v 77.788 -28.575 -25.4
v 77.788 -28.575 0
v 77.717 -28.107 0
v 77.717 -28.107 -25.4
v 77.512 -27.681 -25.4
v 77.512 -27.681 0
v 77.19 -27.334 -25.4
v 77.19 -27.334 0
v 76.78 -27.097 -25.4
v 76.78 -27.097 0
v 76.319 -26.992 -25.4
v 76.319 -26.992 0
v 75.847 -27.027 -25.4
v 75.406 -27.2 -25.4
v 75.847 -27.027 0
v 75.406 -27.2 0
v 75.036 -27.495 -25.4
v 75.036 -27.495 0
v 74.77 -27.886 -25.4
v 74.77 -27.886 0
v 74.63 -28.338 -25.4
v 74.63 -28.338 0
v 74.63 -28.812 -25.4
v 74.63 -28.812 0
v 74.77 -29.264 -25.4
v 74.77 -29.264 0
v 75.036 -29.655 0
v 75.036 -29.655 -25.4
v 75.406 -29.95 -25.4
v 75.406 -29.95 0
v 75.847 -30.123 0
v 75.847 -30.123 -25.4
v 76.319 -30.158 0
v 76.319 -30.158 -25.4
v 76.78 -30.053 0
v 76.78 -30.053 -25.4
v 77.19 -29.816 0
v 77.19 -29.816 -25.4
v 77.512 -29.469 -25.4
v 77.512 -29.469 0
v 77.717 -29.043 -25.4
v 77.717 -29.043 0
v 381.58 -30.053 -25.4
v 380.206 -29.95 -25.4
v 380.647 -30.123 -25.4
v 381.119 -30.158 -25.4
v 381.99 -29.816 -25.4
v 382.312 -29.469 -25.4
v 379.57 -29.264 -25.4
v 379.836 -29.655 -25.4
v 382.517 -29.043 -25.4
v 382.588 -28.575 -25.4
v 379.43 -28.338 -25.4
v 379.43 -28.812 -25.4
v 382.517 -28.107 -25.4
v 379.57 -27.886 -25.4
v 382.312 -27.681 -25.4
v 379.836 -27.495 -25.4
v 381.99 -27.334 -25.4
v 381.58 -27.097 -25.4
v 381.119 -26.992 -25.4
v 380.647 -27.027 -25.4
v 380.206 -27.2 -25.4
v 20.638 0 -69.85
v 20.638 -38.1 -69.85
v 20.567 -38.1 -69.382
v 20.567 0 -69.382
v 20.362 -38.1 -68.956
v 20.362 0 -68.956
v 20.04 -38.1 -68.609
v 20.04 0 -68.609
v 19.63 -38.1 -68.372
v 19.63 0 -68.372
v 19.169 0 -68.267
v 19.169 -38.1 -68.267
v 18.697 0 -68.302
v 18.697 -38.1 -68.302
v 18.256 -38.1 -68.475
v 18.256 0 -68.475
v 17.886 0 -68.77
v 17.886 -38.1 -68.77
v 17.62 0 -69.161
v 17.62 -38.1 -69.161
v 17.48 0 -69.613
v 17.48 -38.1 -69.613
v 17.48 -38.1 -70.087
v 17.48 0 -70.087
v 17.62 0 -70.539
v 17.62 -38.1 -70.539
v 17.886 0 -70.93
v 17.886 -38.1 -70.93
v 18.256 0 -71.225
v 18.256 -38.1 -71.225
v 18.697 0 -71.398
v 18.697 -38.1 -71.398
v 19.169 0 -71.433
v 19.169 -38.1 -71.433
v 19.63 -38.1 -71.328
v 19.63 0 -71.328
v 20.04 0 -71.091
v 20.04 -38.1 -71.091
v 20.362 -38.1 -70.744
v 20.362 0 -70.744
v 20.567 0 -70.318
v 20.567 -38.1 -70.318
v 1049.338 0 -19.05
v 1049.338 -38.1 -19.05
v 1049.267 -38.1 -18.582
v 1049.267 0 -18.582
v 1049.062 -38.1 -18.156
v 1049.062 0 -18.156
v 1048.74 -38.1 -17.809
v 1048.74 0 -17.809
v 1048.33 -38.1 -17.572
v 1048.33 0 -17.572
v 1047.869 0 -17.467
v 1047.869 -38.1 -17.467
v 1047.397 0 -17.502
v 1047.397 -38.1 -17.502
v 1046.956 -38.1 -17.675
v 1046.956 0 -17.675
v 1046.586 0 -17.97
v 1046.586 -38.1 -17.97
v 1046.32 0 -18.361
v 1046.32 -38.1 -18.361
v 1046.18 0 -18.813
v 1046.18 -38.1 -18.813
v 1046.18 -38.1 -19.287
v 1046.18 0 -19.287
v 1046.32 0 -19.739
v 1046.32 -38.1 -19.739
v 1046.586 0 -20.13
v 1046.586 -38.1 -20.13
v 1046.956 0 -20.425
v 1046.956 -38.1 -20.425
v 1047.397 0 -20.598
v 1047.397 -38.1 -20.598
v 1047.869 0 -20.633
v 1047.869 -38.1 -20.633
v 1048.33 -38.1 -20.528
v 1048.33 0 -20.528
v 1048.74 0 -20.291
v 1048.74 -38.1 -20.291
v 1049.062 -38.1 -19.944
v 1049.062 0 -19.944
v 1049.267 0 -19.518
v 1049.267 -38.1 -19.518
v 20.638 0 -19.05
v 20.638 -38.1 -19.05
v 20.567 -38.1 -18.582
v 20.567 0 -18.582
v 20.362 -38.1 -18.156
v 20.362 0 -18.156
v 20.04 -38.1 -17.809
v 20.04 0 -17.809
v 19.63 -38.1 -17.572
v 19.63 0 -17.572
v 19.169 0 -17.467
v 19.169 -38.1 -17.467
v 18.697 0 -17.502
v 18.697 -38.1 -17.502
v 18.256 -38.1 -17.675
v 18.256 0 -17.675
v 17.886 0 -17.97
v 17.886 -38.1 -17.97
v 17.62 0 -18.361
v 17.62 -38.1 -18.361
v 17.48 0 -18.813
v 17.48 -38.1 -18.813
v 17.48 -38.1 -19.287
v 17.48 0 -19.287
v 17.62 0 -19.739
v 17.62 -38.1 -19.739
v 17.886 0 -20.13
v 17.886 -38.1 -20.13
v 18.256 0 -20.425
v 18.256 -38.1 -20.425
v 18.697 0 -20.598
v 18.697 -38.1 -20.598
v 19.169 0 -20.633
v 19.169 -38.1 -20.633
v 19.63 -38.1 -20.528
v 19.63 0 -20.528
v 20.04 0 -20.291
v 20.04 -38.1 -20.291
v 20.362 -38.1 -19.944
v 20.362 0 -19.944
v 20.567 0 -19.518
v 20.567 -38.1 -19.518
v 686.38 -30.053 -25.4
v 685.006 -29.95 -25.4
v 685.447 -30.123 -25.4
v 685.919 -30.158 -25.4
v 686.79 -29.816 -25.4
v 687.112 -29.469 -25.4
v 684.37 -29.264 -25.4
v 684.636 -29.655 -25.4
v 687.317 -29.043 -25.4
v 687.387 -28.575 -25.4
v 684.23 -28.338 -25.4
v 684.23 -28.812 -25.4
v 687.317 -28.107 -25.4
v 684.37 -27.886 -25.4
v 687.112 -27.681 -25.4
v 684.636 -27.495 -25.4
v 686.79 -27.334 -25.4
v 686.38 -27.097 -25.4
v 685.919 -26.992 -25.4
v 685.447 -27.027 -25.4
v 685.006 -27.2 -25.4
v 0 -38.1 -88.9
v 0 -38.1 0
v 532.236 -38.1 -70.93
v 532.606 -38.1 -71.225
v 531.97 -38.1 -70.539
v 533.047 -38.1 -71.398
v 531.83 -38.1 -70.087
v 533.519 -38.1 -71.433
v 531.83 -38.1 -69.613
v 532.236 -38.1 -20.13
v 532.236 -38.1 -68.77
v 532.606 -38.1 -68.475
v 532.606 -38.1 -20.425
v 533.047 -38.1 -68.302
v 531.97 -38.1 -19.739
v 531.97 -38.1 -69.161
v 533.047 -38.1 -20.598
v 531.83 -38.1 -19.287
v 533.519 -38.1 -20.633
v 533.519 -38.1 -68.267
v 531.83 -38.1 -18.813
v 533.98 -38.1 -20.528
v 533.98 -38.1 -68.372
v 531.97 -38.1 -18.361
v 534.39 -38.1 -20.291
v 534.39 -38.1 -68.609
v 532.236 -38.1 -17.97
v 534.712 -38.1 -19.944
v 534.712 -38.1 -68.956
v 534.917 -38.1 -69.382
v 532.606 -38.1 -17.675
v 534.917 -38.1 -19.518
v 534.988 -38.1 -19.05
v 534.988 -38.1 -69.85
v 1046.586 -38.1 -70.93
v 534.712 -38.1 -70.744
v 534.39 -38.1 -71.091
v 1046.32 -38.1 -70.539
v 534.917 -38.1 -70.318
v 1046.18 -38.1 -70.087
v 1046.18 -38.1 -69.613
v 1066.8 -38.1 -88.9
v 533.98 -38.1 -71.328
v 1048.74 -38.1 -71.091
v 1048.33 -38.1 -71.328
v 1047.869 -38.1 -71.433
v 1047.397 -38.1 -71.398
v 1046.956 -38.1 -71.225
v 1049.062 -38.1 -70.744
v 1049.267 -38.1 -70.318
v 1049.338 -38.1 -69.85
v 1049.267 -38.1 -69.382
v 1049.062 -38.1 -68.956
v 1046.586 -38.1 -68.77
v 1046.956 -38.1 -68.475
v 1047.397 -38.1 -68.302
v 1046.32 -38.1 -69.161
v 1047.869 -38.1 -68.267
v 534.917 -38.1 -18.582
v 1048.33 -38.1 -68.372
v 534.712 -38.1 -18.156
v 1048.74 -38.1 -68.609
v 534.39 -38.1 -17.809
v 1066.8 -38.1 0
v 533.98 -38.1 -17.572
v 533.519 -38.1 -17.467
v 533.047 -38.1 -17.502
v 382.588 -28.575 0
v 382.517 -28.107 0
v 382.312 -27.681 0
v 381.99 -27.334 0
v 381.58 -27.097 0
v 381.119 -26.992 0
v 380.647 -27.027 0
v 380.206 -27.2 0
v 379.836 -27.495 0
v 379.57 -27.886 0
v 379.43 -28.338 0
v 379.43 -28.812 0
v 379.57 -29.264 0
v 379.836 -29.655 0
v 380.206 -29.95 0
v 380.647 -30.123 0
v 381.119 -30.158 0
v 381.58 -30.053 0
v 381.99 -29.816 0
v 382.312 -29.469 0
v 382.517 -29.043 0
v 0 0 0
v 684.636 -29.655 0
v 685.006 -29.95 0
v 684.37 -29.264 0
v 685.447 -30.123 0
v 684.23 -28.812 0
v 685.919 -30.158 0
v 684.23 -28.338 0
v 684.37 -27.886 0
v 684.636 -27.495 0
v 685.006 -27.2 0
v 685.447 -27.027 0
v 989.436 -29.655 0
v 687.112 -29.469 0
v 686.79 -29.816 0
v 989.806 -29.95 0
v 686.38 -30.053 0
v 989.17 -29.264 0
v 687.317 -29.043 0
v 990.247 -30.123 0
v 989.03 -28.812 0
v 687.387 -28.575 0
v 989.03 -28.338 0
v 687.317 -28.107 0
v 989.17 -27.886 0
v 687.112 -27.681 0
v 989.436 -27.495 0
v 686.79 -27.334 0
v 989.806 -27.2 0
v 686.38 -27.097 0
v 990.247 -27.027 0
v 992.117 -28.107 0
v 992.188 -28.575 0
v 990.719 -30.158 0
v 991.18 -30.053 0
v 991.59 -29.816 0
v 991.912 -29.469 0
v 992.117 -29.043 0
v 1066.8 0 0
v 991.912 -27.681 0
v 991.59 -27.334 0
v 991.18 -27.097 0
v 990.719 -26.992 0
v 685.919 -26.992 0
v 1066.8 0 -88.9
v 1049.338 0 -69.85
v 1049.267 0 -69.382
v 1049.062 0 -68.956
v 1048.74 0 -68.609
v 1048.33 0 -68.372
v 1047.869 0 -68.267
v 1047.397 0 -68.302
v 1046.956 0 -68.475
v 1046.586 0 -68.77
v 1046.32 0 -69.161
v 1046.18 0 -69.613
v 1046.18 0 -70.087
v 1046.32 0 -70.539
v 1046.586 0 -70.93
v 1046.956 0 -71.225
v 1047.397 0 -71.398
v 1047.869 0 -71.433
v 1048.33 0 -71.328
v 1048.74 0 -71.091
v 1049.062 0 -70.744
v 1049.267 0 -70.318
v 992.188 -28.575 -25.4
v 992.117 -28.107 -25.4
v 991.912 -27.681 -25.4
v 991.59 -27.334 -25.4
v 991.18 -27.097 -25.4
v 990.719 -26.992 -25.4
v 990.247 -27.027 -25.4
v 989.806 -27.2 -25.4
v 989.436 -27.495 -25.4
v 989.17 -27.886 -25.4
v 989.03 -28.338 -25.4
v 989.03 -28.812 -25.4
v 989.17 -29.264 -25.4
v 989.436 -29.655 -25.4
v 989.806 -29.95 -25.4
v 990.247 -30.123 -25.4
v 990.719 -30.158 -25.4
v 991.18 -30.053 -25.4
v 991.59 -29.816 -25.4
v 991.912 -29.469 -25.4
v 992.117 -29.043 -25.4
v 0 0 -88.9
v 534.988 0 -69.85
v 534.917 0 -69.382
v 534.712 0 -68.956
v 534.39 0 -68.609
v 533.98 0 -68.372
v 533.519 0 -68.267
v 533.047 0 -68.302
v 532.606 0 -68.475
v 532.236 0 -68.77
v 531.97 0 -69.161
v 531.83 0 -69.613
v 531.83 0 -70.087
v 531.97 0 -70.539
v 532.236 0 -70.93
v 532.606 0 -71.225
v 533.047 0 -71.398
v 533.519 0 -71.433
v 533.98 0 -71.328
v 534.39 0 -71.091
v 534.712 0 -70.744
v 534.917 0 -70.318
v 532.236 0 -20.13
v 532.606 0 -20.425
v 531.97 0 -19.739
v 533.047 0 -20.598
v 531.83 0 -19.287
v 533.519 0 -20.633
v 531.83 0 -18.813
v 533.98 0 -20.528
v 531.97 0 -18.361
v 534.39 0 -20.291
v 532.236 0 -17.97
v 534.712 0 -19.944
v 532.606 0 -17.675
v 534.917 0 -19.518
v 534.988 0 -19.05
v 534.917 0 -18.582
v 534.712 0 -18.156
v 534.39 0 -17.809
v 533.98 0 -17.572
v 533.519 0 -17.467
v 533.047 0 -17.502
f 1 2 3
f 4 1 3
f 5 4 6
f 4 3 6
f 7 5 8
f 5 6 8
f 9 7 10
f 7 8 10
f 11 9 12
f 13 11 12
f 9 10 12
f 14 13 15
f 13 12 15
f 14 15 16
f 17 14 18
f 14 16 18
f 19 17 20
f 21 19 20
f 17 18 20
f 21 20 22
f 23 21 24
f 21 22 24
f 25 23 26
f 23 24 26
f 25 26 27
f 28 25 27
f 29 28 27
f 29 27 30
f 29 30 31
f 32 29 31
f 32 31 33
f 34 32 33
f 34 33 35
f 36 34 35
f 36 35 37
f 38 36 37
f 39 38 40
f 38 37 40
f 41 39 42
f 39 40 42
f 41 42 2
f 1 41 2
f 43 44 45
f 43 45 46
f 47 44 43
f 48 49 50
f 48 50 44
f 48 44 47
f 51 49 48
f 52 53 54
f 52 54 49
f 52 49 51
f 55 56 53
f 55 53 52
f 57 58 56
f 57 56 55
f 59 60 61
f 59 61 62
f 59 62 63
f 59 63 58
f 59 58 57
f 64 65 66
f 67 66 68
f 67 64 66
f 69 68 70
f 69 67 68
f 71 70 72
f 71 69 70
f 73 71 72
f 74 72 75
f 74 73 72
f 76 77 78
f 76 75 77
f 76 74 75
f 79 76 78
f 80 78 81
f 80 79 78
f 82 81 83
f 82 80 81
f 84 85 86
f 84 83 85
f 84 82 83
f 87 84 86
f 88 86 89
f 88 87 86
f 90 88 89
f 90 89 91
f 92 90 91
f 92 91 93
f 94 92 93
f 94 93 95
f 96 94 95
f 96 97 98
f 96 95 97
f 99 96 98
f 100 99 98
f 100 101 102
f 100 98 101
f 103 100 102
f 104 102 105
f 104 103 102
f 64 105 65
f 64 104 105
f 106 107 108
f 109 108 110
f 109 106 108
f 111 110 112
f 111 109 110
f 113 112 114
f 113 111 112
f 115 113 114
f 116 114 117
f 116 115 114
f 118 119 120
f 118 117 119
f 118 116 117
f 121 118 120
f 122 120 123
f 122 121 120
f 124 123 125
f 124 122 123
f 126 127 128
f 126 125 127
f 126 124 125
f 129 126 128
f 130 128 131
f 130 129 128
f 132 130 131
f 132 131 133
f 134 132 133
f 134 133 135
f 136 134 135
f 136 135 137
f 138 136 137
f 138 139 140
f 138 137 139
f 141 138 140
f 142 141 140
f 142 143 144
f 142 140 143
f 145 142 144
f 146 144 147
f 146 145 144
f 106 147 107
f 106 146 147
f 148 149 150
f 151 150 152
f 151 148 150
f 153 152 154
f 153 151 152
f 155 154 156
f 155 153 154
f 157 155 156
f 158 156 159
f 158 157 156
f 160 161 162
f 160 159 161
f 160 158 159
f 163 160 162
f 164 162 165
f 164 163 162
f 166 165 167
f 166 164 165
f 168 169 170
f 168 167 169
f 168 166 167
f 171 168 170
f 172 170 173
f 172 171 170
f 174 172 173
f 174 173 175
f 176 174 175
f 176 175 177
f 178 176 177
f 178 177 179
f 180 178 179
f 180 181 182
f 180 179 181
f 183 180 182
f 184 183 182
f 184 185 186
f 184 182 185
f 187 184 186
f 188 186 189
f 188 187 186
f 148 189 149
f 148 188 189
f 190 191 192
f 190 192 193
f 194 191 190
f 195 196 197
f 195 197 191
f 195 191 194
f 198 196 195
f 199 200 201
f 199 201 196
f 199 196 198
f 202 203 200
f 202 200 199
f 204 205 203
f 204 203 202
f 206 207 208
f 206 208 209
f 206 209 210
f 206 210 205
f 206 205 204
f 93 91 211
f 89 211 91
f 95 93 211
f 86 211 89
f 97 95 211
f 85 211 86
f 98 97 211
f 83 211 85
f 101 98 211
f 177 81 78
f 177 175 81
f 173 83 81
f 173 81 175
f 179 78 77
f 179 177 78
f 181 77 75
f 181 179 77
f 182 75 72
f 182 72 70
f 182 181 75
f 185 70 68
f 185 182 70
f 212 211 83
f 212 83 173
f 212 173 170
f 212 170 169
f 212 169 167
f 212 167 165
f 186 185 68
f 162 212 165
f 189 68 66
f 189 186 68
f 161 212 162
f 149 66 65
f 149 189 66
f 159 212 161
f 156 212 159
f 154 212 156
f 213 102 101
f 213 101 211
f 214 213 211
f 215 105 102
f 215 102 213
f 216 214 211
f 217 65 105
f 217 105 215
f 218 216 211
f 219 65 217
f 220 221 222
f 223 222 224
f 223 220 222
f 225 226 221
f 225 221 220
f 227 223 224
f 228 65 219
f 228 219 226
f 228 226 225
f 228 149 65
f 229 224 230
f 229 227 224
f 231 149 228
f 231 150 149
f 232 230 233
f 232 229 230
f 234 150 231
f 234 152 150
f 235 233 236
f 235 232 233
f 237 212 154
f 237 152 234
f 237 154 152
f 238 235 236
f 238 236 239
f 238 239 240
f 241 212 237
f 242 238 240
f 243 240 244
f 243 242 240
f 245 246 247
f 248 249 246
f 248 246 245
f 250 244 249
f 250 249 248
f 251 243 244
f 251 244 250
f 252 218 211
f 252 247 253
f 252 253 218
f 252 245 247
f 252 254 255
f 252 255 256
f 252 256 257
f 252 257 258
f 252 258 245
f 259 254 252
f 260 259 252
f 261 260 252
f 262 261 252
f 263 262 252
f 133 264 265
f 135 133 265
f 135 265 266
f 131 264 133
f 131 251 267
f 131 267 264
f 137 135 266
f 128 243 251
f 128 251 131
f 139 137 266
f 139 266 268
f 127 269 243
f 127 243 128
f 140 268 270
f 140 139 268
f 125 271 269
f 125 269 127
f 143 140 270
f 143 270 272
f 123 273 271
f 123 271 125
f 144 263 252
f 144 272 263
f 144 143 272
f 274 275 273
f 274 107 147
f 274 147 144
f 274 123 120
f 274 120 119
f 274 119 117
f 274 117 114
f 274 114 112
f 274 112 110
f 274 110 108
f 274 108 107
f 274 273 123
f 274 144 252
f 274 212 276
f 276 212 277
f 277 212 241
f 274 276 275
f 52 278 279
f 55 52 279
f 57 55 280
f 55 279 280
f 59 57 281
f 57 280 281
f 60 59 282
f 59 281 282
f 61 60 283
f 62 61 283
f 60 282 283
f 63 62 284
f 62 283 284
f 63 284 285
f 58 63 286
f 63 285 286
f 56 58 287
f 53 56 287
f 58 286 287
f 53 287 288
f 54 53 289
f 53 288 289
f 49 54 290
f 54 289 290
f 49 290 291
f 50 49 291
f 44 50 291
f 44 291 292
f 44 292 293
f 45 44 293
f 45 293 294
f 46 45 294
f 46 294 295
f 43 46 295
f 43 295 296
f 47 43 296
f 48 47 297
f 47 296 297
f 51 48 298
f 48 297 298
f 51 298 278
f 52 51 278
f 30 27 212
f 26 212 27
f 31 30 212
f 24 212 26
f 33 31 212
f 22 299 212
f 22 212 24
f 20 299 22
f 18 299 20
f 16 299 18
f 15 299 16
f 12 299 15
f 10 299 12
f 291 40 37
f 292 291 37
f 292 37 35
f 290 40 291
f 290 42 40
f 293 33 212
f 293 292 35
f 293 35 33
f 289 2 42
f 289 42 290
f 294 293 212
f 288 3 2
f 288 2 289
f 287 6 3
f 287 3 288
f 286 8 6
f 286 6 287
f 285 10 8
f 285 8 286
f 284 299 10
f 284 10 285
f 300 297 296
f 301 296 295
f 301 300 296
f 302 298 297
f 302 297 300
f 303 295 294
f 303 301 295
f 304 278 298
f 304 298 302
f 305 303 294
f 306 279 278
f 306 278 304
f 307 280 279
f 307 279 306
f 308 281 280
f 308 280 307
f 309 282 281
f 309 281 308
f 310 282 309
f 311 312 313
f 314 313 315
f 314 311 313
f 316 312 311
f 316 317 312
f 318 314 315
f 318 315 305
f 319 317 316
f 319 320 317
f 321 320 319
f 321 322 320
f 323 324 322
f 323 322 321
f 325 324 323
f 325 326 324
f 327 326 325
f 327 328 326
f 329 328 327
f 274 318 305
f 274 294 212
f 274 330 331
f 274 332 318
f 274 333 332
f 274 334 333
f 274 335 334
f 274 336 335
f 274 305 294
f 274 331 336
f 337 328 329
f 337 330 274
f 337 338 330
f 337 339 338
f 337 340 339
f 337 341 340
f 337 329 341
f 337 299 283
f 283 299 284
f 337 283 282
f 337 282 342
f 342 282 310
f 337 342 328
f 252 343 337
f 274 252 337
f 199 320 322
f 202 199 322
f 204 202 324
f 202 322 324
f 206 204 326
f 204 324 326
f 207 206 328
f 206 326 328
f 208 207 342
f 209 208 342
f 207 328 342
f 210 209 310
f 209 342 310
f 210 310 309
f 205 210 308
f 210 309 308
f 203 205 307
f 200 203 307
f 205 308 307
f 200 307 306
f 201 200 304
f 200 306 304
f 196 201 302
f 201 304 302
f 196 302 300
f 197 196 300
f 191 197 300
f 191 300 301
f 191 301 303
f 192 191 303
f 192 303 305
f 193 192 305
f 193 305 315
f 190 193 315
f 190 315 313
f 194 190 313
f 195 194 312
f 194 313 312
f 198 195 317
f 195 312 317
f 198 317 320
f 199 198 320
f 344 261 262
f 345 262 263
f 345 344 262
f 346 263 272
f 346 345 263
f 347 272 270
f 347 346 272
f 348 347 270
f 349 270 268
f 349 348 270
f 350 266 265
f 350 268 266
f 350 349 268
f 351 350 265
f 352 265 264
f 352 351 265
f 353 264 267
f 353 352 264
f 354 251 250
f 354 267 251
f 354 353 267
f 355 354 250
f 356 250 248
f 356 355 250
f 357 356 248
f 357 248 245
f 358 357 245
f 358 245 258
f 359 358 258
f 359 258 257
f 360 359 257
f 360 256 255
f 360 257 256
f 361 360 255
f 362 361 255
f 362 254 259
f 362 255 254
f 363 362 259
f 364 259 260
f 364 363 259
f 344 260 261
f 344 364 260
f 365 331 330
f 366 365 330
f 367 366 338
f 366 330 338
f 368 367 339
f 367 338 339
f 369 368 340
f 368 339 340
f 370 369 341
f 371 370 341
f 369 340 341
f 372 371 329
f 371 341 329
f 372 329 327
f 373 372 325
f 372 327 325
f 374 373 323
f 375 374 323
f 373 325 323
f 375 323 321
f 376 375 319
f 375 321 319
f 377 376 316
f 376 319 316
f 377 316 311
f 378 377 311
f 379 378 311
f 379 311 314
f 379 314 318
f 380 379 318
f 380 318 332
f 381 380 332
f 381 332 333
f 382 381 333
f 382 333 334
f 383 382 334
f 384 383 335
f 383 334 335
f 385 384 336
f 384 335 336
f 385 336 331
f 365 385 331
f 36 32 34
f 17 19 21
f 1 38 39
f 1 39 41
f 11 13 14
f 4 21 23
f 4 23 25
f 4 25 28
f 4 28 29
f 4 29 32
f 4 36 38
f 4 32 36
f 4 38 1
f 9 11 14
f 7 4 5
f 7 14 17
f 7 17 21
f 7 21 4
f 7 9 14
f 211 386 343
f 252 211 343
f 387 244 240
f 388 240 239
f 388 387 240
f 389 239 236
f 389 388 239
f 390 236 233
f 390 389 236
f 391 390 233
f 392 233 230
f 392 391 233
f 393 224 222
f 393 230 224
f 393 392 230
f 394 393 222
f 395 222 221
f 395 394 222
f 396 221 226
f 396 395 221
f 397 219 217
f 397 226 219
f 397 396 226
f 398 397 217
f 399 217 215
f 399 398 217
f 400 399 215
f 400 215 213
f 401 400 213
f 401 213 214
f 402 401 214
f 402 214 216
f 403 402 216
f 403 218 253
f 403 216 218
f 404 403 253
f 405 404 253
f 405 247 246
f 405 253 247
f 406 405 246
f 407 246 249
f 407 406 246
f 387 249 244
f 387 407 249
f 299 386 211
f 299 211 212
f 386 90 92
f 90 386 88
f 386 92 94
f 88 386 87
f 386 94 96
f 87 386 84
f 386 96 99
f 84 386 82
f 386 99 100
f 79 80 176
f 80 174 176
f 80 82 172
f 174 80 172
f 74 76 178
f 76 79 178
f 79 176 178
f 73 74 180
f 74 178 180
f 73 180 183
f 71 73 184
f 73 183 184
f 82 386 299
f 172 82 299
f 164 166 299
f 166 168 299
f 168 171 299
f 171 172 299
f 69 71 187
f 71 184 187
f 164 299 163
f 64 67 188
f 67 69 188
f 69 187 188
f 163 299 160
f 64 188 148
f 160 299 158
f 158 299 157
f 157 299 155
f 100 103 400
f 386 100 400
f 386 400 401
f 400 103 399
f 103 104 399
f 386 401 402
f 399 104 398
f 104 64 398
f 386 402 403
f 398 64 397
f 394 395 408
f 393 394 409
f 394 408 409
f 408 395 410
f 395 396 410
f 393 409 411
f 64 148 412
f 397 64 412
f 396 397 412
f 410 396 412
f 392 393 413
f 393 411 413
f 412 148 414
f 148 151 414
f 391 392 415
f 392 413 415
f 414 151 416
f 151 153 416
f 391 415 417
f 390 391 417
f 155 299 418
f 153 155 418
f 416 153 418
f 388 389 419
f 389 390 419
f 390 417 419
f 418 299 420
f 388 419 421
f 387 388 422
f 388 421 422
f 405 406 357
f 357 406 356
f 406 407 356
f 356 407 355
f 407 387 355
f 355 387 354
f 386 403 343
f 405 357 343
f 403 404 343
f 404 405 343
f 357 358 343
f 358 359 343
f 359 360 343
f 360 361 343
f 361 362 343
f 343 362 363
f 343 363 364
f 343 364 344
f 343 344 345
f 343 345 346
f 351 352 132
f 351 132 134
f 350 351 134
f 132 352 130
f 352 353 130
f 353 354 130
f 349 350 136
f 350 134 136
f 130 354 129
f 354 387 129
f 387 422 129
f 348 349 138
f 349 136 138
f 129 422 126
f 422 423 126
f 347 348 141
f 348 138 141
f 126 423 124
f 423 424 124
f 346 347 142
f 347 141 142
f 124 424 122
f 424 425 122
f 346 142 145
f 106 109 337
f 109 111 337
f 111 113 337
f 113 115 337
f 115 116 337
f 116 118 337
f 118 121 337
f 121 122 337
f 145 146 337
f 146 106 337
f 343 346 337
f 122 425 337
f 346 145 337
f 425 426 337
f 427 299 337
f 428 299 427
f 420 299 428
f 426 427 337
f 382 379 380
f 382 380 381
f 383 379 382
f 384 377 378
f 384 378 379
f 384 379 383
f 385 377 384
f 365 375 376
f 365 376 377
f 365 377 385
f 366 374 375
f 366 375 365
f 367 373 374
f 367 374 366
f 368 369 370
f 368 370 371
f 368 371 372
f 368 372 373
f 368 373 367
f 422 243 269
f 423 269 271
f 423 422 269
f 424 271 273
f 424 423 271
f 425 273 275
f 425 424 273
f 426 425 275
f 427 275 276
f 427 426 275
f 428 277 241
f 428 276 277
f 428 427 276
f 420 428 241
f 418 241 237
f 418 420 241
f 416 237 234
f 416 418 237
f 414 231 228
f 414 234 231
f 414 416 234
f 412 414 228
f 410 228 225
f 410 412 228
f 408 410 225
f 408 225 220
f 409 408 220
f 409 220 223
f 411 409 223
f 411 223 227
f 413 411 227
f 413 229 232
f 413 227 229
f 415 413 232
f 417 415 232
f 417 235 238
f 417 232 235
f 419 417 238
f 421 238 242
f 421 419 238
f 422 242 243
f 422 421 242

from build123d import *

# Parameters (mm, degrees)
F0_W     = 1066.8
F0_H     = 88.9
F1_DEPTH = 38.1
F2_R     = 1.5875
F3_DEPTH = 25.4
F4_R     = 1.5875
F5_DEPTH = 38.101


with BuildPart() as f1:
    # F0 (on Front) → F1 (new body)
    with BuildSketch(Plane.XZ):
        with Locations((533.4, -44.45)):
            Rectangle(F0_W, F0_H)
    extrude(amount=F1_DEPTH)

    # F2 (on Top) → F3 (cut)
    with BuildSketch(Plane.XY):
        with Locations((76.2, -28.575)):
            Circle(F2_R)
        with Locations((381, -28.575)):
            Circle(F2_R)
        with Locations((685.8, -28.575)):
            Circle(F2_R)
        with Locations((990.6, -28.575)):
            Circle(F2_R)
    extrude(amount=-F3_DEPTH, mode=Mode.SUBTRACT)

    # F4 (on Front) → F5 (cut, through all)
    with BuildSketch(Plane.XZ):
        with Locations((19.05, -19.05)):
            Circle(F4_R)
        with Locations((19.05, -69.85)):
            Circle(F4_R)
        with Locations((533.4, -19.05)):
            Circle(F4_R)
        with Locations((533.4, -69.85)):
            Circle(F4_R)
        with Locations((1047.75, -19.05)):
            Circle(F4_R)
        with Locations((1047.75, -69.85)):
            Circle(F4_R)
    extrude(amount=F5_DEPTH, mode=Mode.SUBTRACT)


solid = f1.part
